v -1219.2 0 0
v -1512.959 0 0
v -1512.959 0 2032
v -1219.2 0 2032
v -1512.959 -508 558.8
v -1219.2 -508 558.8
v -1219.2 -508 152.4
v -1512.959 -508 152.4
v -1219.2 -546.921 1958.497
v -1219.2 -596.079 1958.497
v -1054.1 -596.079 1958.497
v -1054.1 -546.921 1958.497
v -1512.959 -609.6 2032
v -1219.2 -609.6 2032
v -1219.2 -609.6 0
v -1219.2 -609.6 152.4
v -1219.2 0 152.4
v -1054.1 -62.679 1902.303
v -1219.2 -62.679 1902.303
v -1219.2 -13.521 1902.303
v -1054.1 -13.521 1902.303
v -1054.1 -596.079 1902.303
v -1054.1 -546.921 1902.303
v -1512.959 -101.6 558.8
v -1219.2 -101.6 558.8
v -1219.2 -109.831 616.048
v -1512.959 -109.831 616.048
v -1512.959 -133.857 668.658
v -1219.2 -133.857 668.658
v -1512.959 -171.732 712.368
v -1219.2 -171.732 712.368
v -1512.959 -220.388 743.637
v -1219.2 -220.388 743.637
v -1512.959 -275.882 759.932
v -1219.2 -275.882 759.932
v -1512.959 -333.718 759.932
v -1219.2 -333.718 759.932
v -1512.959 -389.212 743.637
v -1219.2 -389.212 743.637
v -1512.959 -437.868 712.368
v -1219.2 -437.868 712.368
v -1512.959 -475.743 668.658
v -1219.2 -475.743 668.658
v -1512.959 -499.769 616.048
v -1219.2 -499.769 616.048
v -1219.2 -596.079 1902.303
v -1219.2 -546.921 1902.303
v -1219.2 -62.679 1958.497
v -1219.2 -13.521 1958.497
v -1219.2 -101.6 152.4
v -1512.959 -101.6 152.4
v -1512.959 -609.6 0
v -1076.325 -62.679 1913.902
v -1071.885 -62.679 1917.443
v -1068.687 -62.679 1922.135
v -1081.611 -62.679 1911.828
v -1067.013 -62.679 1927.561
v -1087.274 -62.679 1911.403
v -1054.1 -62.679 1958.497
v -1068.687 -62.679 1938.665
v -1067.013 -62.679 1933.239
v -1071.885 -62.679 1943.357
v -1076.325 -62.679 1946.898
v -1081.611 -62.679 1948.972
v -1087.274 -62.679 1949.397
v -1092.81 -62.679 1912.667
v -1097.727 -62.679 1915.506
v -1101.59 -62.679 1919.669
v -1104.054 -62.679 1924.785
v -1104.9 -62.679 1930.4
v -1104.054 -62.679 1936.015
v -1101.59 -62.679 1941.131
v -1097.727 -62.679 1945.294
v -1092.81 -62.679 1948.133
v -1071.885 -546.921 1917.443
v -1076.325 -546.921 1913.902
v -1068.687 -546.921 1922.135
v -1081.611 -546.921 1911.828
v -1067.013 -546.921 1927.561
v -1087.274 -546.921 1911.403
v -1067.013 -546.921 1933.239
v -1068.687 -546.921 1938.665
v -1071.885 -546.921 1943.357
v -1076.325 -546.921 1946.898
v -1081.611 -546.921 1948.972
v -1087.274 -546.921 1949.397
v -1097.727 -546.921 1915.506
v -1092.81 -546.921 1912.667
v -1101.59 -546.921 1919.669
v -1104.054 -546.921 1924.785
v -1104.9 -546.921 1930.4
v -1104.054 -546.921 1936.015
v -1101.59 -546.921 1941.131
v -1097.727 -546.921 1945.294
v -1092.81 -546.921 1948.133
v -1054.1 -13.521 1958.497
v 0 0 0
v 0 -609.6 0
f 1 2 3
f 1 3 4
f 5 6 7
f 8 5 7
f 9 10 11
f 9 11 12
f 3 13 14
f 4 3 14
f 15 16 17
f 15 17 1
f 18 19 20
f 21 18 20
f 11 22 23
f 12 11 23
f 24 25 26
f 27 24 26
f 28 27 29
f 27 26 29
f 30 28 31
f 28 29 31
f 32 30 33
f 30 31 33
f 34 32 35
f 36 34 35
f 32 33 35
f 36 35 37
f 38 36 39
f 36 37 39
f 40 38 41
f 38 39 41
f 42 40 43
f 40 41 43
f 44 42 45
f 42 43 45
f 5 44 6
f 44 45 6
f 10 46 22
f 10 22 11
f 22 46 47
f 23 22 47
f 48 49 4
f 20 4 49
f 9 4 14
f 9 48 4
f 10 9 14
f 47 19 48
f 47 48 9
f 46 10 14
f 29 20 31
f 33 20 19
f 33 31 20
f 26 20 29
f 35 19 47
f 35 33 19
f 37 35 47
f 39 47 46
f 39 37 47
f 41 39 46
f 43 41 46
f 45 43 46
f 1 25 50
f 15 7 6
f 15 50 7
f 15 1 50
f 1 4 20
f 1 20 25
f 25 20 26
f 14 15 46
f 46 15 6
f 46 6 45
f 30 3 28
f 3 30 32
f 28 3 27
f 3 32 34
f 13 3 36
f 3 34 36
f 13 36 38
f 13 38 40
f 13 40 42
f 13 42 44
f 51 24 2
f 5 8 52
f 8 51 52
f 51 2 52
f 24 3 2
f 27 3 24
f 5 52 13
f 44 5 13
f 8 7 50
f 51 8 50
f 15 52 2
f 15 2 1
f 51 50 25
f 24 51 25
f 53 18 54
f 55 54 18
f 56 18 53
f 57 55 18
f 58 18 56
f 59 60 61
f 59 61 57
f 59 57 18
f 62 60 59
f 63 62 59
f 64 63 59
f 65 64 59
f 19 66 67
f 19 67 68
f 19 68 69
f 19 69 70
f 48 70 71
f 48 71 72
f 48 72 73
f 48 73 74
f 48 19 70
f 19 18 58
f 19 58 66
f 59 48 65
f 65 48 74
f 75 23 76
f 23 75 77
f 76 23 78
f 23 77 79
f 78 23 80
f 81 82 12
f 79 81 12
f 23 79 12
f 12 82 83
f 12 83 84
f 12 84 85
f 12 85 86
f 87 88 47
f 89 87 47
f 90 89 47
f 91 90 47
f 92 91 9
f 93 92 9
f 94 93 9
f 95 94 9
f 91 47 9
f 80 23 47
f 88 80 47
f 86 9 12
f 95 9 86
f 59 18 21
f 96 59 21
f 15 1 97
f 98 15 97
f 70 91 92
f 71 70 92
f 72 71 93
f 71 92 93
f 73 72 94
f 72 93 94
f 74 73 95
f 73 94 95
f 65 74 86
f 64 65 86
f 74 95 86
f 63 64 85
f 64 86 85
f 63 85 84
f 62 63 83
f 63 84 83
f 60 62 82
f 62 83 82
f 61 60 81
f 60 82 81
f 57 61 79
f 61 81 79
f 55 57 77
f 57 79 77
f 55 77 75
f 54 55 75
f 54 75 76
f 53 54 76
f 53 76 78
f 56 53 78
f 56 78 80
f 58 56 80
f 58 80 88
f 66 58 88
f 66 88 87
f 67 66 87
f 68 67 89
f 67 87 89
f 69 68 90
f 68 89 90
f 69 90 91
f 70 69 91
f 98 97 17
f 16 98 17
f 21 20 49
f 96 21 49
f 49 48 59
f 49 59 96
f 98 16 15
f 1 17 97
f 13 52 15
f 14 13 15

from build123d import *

# Parameters (mm, degrees)
F1_DEPTH = 609.6
F2_W     = 293.7587650299
F2_H     = 609.6
F3_DEPTH = 2032
F4_W     = 49.1579873383
F4_H     = 56.1940948486
F5_DEPTH = 165.1
F6_R     = 19.05
F7_DEPTH = 484.2420126617
F9_DEPTH = 293.7587650299


with BuildPart() as f1:
    # F0 (on Front) → F1 (new body)
    with BuildSketch(Plane.XZ):
        Polygon((-1219.2, 0), (0, 0), (-1219.2, 152.4), align=None)
    extrude(amount=F1_DEPTH)


with BuildPart() as f3:
    # F2 (on face) → F3 (new body)
    with BuildSketch(Plane(origin=(0, 0, 0), x_dir=(1, 0, 0), z_dir=(0, 0, -1))):
        with Locations((-1366.079382515, 304.8)):
            Rectangle(F2_W, F2_H)
    extrude(amount=-F3_DEPTH)

    # F4 (on face) → F5 (join)
    with BuildSketch(Plane.YZ.offset(-1219.2)):
        with Locations((-571.5, 1930.4)):
            Rectangle(F4_W, F4_H)
        with Locations((-38.1, 1930.4)):
            Rectangle(F4_W, F4_H)
    extrude(amount=F5_DEPTH)

    # F6 (on face) → F7 (join, through all)
    with BuildSketch(Plane(origin=(0, -546.9210063308, 0), x_dir=(-1, 0, 0), z_dir=(0, 1, 0))):
        with Locations((1085.85, 1930.4)):
            Circle(F6_R)
    extrude(amount=F7_DEPTH)

    # F8 (on face) → F9 (cut, through all)
    with BuildSketch(Plane.YZ.offset(-1219.2)):
        with BuildLine():
            Line((-508, 558.8), (-508, 152.4))
            Line((-508, 152.4), (-101.6, 152.4))
            Line((-101.6, 152.4), (-101.6, 558.8))
            ThreePointArc((-101.6, 558.8), (-304.8, 762), (-508, 558.8))
        make_face()
    extrude(amount=-F9_DEPTH, mode=Mode.SUBTRACT)


solid = Compound([f1.part, f3.part])
